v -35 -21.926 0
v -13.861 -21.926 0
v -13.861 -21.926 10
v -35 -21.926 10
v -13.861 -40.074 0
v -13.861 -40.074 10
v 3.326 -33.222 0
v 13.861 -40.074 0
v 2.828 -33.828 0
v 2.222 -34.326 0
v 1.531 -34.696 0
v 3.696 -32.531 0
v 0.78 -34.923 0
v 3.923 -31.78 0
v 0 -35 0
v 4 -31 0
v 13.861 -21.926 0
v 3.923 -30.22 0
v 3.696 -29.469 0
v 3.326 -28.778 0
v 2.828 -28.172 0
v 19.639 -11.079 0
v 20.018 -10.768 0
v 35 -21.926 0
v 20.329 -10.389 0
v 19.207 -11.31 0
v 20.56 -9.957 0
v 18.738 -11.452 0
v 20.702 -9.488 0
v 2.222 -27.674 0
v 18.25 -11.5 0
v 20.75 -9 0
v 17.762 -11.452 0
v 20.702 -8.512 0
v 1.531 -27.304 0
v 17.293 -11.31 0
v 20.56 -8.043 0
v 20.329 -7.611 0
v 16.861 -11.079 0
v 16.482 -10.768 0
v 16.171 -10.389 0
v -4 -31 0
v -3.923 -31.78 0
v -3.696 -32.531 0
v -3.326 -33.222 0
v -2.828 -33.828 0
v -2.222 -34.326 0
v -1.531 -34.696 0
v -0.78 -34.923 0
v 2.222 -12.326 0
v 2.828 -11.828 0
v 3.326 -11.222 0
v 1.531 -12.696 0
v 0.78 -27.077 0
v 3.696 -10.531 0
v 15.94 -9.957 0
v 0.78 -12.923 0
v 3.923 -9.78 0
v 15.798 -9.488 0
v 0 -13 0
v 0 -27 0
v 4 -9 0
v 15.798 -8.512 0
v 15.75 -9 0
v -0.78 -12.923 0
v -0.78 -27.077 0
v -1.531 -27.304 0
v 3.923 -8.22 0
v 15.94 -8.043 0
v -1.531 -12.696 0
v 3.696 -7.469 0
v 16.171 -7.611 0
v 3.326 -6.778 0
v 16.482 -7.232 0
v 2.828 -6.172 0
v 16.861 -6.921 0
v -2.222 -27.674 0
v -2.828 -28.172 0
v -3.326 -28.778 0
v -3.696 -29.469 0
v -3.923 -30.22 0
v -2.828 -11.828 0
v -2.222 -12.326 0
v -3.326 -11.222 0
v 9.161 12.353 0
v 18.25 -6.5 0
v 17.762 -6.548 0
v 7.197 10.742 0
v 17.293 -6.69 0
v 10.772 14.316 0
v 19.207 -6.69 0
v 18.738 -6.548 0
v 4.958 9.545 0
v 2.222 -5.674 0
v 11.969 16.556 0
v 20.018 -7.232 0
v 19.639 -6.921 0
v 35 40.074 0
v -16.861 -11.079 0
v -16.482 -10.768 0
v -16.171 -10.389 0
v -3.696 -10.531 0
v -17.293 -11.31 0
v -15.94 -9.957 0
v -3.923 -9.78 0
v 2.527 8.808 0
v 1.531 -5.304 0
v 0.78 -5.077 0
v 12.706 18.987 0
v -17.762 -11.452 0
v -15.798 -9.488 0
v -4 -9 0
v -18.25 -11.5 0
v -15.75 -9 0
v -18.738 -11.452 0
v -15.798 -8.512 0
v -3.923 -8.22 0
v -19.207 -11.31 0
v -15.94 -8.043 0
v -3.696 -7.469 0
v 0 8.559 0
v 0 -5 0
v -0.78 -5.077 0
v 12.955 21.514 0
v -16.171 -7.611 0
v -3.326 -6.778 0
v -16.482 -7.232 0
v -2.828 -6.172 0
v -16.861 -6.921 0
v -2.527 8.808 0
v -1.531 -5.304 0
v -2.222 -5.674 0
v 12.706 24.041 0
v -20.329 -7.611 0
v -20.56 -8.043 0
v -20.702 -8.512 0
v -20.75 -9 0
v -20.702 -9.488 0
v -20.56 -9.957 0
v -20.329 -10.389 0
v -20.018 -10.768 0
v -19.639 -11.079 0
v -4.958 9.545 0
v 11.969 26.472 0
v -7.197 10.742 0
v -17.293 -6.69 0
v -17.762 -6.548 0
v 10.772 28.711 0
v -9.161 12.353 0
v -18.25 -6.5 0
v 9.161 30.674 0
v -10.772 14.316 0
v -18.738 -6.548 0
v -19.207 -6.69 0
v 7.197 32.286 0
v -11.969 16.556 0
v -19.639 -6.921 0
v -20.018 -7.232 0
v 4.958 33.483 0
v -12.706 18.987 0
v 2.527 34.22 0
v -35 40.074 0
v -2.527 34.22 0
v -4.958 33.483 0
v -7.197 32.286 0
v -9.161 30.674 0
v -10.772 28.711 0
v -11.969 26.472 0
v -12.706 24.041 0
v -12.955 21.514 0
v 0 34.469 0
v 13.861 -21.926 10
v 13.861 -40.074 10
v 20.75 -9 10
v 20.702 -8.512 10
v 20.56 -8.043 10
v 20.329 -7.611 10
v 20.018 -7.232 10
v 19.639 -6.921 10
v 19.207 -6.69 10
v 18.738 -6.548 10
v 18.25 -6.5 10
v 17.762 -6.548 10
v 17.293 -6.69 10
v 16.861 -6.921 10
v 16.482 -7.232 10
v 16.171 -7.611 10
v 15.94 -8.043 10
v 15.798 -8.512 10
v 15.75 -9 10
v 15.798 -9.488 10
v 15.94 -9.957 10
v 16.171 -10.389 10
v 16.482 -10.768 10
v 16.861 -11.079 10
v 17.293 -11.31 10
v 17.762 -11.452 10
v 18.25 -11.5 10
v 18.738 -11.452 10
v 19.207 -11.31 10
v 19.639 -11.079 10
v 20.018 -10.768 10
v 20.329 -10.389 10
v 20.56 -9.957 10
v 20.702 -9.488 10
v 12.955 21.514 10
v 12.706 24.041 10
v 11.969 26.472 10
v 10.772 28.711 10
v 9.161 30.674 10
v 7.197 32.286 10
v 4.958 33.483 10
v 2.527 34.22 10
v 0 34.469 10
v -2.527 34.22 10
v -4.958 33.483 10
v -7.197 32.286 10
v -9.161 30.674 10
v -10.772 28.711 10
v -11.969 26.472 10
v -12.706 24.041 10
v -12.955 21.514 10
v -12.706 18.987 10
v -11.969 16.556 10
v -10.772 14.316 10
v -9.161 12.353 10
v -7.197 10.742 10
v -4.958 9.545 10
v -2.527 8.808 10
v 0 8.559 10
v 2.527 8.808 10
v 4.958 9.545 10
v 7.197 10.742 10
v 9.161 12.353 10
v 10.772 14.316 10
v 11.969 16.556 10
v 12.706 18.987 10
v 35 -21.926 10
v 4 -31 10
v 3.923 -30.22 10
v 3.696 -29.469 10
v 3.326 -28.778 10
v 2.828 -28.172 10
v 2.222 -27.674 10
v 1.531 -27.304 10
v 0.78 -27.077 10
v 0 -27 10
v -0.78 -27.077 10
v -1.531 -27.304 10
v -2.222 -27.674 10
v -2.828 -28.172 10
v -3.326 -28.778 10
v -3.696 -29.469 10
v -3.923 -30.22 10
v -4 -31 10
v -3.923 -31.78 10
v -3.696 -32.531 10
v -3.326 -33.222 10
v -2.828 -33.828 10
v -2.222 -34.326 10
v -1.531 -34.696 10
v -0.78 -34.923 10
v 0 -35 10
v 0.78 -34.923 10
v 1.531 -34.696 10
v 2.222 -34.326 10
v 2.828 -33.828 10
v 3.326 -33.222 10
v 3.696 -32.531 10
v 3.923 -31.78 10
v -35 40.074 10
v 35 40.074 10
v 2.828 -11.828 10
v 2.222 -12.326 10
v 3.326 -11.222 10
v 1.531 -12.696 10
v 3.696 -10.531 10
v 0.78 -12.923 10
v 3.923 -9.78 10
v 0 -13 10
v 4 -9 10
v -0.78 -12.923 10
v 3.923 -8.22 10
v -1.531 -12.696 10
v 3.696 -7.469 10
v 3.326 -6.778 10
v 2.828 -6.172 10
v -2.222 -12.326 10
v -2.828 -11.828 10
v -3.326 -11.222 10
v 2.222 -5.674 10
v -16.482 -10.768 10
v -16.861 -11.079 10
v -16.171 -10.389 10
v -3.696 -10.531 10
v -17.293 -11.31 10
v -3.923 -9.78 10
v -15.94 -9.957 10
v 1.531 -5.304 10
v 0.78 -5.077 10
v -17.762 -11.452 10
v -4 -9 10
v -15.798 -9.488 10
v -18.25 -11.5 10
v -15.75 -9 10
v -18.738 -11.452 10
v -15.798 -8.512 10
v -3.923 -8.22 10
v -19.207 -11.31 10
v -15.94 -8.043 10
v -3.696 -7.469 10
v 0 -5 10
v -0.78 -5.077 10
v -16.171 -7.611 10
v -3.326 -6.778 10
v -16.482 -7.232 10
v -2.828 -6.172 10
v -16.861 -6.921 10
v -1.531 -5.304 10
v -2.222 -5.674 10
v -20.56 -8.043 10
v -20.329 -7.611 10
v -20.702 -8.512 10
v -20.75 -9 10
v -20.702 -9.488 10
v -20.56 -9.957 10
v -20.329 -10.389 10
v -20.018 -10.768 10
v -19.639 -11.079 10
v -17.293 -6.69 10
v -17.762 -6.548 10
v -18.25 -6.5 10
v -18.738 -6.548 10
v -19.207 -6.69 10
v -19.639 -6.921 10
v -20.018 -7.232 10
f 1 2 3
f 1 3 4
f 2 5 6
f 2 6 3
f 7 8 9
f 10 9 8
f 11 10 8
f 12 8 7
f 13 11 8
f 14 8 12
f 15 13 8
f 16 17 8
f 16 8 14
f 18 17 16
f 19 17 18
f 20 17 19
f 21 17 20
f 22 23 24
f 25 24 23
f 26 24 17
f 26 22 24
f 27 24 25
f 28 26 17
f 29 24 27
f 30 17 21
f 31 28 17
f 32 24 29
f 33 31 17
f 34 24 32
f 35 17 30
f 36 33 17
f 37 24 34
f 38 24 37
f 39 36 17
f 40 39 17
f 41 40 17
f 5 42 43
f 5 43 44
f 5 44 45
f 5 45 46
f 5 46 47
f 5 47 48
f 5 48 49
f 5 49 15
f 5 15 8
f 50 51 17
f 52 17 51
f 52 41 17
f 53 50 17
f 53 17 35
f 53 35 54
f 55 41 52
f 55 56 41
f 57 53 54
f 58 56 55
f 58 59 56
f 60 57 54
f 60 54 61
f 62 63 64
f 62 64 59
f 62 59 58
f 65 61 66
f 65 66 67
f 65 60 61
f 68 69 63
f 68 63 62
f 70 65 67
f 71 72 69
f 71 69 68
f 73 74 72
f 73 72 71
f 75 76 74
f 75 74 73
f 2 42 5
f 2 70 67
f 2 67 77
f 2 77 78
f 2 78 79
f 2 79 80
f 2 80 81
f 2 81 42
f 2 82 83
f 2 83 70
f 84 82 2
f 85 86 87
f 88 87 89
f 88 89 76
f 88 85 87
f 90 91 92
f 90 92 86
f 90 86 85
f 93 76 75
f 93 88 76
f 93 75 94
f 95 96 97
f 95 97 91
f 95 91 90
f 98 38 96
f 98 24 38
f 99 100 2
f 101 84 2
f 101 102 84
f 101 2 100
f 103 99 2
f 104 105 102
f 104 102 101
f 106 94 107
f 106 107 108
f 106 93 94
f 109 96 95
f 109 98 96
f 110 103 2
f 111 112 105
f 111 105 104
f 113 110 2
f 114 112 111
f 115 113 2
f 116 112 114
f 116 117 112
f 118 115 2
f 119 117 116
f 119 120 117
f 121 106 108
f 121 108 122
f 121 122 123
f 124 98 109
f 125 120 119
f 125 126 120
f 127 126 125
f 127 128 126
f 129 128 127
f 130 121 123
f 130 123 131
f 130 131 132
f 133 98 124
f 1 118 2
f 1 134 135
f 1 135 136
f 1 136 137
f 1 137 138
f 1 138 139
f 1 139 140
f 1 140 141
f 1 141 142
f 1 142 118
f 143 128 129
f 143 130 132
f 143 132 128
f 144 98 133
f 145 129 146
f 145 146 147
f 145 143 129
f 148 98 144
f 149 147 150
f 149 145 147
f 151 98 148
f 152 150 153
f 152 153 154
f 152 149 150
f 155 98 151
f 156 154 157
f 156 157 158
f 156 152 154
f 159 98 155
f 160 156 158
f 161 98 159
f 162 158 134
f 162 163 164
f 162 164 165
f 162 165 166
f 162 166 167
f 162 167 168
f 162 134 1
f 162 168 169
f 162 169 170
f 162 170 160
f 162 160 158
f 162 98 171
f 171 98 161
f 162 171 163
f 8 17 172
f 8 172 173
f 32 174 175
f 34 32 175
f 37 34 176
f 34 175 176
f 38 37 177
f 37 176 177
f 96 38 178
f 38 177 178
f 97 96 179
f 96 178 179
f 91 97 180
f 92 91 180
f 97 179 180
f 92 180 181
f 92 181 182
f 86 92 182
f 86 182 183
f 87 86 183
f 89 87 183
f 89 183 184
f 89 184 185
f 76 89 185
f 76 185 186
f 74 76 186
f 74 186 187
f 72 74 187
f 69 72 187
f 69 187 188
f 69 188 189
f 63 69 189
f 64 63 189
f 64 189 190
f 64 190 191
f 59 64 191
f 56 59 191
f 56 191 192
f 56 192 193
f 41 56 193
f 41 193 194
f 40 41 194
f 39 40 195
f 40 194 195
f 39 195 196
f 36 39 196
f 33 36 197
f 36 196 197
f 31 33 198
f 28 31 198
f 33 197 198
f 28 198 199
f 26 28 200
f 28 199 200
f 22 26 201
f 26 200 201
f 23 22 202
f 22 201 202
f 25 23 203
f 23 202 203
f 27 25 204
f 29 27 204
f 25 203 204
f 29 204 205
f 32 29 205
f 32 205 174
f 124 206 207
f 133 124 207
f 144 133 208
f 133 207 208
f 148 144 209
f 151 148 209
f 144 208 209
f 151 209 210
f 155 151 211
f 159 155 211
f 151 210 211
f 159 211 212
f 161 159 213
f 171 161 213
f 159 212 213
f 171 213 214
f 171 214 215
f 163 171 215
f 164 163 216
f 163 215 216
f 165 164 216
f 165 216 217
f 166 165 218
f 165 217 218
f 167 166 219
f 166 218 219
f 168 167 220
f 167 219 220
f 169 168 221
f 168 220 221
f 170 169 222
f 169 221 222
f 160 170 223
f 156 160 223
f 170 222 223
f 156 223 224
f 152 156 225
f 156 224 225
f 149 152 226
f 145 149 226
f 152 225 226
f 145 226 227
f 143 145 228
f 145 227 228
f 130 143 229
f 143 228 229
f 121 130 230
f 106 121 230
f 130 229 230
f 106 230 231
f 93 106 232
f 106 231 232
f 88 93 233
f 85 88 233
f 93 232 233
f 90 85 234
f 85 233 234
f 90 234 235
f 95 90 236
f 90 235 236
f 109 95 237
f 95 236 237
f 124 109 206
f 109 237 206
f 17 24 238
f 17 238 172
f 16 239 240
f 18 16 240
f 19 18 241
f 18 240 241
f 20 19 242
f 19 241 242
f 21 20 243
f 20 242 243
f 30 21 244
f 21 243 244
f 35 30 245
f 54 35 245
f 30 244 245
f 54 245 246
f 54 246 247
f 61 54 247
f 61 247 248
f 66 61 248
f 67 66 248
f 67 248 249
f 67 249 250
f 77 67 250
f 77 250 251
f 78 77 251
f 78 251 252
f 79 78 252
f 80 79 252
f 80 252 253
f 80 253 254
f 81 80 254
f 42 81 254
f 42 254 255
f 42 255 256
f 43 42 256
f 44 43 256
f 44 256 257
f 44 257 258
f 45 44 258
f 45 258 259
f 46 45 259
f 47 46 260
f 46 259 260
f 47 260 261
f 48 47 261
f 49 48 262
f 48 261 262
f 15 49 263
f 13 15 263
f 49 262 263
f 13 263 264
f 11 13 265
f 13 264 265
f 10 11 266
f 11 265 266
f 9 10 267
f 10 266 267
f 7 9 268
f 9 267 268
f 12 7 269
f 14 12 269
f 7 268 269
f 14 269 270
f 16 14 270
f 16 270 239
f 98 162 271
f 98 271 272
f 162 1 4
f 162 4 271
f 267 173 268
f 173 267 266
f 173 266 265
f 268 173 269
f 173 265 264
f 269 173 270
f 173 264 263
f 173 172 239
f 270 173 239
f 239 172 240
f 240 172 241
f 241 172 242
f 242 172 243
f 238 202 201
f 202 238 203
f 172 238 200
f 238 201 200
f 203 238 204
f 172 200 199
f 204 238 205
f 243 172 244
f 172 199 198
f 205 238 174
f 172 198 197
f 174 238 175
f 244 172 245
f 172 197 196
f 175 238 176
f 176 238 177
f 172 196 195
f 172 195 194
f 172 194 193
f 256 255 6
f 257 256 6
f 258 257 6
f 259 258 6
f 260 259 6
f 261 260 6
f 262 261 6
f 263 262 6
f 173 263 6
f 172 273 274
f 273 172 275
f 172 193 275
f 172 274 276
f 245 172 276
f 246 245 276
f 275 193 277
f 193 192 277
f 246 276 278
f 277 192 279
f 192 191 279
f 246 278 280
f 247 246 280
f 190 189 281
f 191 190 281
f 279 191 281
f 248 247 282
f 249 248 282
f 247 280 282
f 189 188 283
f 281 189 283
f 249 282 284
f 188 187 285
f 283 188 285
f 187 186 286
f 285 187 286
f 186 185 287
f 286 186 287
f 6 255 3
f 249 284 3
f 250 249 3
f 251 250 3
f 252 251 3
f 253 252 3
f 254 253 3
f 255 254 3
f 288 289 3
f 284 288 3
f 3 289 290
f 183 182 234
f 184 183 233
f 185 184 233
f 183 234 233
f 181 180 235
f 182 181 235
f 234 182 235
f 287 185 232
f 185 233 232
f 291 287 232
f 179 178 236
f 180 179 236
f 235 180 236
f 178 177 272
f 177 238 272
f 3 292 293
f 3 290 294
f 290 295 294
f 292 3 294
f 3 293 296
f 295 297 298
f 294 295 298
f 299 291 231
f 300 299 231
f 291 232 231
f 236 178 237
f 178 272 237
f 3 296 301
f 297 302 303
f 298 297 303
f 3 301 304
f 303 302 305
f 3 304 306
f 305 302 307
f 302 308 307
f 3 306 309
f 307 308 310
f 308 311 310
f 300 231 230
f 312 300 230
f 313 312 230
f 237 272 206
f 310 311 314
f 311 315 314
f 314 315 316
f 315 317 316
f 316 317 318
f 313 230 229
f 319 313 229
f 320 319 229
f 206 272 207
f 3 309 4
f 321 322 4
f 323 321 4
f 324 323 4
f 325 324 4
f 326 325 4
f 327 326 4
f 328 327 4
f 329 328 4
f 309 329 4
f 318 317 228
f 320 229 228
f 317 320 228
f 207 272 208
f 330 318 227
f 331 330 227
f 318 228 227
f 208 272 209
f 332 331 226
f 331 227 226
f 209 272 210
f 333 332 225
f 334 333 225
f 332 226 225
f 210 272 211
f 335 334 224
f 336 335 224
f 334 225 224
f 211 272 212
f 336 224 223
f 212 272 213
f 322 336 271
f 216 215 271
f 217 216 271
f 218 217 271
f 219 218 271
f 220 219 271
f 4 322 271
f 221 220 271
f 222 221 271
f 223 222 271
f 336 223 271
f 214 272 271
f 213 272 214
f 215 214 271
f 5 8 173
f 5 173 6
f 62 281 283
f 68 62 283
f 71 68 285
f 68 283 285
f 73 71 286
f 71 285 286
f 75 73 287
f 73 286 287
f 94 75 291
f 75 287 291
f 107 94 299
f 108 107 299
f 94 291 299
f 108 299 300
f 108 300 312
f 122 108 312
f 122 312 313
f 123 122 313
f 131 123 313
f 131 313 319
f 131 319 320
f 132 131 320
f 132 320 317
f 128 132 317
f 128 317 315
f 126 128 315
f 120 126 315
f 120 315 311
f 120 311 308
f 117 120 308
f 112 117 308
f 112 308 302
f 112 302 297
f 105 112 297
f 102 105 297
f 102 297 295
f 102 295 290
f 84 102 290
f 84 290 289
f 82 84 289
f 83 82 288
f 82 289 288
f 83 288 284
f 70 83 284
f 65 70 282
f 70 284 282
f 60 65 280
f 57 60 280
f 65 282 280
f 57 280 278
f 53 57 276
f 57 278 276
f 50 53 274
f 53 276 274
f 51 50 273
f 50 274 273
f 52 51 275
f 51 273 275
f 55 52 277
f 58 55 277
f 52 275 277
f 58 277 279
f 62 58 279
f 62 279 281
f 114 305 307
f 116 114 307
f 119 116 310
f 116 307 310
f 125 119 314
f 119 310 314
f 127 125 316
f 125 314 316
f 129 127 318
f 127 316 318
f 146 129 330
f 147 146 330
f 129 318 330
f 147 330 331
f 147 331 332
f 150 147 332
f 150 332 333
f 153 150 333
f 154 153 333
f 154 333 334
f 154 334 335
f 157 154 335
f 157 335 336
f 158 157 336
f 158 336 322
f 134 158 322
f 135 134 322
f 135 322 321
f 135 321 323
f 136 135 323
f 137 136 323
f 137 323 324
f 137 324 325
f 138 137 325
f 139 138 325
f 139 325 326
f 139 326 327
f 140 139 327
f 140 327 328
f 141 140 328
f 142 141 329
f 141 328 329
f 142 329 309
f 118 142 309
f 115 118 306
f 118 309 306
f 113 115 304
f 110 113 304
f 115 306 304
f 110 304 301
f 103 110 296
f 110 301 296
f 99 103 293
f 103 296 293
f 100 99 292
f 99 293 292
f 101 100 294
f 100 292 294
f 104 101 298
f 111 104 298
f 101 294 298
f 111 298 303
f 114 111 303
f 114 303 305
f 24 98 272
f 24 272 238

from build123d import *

# Parameters (mm, degrees)
BOSS_EXTRUDE1_DEPTH = 10
SKETCH2_R           = 4
SKETCH2_R_2         = 2.5
CUT_EXTRUDE1_DEPTH  = 11
SKETCH8_R           = 12.955
CUT_EXTRUDE9_DEPTH  = 10


with BuildPart() as part:
    # Sketch1 → Boss-Extrude1 (new body)
    with BuildSketch(Plane.XY):
        Polygon((-35, 40.07390675), (35, 40.07390675), (35, -21.92609325), (13.861088822, -21.92609325), (13.861088822, -40.07390675), (-13.861088822, -40.07390675), (-13.861088822, -21.92609325), (-35, -21.92609325), align=None)
    extrude(amount=BOSS_EXTRUDE1_DEPTH)

    # Sketch2 → Cut-Extrude1 (cut, through all)
    with BuildSketch(Plane.XY.offset(10)):
        with Locations((0, -31)):
            Circle(SKETCH2_R)
        with Locations((0, -9)):
            Circle(SKETCH2_R)
        with Locations((-18.25, -9)):
            Circle(SKETCH2_R_2)
        with Locations((18.25, -9)):
            Circle(SKETCH2_R_2)
    extrude(amount=-CUT_EXTRUDE1_DEPTH, mode=Mode.SUBTRACT)

    # Sketch8 → Cut-Extrude9 (cut)
    with BuildSketch(Plane.XY.offset(10)):
        with Locations((0, 21.51390675)):
            Circle(SKETCH8_R)
    extrude(amount=-CUT_EXTRUDE9_DEPTH, mode=Mode.SUBTRACT)


solid = part.part
